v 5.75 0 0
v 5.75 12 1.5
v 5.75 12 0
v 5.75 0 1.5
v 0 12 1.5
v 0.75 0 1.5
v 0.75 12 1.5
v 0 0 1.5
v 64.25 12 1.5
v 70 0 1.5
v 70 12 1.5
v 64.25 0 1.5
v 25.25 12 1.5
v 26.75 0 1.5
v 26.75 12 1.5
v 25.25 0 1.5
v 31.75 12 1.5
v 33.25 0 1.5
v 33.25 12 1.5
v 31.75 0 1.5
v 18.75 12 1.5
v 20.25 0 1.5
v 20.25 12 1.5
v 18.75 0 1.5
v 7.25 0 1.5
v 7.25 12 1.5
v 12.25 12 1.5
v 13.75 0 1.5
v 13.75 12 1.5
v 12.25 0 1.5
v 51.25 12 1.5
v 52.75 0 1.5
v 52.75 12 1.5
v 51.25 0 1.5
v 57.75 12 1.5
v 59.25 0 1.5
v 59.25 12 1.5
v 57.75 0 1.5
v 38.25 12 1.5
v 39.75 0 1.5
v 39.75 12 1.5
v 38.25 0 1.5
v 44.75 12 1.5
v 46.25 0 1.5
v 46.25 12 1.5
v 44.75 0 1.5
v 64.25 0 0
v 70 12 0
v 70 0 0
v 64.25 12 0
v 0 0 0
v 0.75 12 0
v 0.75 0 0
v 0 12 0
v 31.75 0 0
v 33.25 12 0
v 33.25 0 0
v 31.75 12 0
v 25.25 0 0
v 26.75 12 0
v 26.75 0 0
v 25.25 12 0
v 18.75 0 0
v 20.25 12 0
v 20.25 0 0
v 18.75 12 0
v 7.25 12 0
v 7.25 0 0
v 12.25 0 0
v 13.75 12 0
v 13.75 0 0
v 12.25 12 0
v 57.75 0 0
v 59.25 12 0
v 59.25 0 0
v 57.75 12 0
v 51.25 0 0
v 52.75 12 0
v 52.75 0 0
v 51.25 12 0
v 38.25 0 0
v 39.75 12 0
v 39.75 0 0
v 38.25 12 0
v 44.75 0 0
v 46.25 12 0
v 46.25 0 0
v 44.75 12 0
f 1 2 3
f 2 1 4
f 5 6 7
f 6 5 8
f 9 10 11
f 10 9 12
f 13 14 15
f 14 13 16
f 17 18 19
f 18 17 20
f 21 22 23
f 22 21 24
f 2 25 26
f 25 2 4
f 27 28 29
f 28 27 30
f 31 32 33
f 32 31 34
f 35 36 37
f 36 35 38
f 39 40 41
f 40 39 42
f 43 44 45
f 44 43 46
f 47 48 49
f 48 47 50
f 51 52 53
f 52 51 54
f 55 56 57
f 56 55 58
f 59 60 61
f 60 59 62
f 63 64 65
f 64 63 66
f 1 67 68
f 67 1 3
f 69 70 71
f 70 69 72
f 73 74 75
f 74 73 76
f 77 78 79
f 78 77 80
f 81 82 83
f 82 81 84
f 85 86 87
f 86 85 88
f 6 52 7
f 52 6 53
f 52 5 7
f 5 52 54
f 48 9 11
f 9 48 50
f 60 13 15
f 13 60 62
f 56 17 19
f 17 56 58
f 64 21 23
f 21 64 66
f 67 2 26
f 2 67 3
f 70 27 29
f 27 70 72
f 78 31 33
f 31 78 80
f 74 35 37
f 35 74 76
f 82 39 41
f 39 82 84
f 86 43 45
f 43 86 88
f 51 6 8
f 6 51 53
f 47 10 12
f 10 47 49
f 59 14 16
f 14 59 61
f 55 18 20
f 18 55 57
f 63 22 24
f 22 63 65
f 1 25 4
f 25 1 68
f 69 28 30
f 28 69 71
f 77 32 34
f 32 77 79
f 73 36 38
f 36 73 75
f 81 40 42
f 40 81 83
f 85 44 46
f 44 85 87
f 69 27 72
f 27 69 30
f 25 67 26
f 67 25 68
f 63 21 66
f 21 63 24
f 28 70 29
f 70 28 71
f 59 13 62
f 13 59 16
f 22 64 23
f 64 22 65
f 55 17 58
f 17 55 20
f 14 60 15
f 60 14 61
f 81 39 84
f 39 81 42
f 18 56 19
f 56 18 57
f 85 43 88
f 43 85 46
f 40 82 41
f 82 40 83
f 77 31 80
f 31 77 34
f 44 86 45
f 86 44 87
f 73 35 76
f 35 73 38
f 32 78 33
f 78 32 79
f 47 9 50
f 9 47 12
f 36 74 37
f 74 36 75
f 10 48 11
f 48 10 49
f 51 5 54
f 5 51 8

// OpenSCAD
// Dimensions for the 10-well comb design

// Overall dimensions
spine_length = 70;    // Length of the spine (X dimension) in mm
spine_width = 12;      // Width of the spine (Y dimension) in mm
plate_thickness = 1.5; // Thickness of the plate (Z dimension)

// Tooth dimensions
num_teeth = 10;        // Number of teeth
tooth_width = 5.0;     // Width of each tooth (X dimension)
tooth_length = 12;     // Length of each tooth (Y dimension - this is the depth/hang length in the -Y direction)
gap_width = 1.5;       // Gap between neighboring teeth (Y dimension)

// Positioning calculations
// Total width occupied by teeth and gaps along the Y-axis
total_tooth_and_gap_width = (num_teeth * tooth_width) + ((num_teeth - 1) * gap_width);

// Calculate the starting X position for the first tooth, centered along the spine_length (X-axis).
x_center = spine_length / 2;
tooth_start_x = x_center - (total_tooth_and_gap_width / 2);


// --- Main Body Construction ---

difference() {
    // 1. Base block for the entire comb structure (Spine)
    color("gray")
    cube([spine_length, spine_width, plate_thickness]);

    // 2. Cut out the spaces where teeth should be (the gaps/slots)
    for (i = [0 : num_teeth - 1]) {
        // Calculate the center X position for the i-th tooth slot
        tooth_center_x = tooth_start_x + (i * (tooth_width + gap_width));

        // Define the rectangular cutout shape. It runs along X, has width tooth_width, and extends into -Y by tooth_length.
        // The cut starts at Y = spine_width (12mm) and goes down by tooth_length (12mm).
        // We translate to the center of the tooth slot in X, and position it such that its extent covers the required area.

        translate([tooth_center_x - tooth_width/2, 0, 0]) {
            // The cube dimensions must match the feature being cut:
            // X dimension = tooth_width (5.0 mm)
            // Y dimension = tooth_length (12.0 mm) -> This defines how far it hangs into the negative Y space relative to its starting point.
            // Z dimension = plate_thickness (1.5 mm)
            cube([tooth_width, tooth_length, plate_thickness]);
        }
    }
}
